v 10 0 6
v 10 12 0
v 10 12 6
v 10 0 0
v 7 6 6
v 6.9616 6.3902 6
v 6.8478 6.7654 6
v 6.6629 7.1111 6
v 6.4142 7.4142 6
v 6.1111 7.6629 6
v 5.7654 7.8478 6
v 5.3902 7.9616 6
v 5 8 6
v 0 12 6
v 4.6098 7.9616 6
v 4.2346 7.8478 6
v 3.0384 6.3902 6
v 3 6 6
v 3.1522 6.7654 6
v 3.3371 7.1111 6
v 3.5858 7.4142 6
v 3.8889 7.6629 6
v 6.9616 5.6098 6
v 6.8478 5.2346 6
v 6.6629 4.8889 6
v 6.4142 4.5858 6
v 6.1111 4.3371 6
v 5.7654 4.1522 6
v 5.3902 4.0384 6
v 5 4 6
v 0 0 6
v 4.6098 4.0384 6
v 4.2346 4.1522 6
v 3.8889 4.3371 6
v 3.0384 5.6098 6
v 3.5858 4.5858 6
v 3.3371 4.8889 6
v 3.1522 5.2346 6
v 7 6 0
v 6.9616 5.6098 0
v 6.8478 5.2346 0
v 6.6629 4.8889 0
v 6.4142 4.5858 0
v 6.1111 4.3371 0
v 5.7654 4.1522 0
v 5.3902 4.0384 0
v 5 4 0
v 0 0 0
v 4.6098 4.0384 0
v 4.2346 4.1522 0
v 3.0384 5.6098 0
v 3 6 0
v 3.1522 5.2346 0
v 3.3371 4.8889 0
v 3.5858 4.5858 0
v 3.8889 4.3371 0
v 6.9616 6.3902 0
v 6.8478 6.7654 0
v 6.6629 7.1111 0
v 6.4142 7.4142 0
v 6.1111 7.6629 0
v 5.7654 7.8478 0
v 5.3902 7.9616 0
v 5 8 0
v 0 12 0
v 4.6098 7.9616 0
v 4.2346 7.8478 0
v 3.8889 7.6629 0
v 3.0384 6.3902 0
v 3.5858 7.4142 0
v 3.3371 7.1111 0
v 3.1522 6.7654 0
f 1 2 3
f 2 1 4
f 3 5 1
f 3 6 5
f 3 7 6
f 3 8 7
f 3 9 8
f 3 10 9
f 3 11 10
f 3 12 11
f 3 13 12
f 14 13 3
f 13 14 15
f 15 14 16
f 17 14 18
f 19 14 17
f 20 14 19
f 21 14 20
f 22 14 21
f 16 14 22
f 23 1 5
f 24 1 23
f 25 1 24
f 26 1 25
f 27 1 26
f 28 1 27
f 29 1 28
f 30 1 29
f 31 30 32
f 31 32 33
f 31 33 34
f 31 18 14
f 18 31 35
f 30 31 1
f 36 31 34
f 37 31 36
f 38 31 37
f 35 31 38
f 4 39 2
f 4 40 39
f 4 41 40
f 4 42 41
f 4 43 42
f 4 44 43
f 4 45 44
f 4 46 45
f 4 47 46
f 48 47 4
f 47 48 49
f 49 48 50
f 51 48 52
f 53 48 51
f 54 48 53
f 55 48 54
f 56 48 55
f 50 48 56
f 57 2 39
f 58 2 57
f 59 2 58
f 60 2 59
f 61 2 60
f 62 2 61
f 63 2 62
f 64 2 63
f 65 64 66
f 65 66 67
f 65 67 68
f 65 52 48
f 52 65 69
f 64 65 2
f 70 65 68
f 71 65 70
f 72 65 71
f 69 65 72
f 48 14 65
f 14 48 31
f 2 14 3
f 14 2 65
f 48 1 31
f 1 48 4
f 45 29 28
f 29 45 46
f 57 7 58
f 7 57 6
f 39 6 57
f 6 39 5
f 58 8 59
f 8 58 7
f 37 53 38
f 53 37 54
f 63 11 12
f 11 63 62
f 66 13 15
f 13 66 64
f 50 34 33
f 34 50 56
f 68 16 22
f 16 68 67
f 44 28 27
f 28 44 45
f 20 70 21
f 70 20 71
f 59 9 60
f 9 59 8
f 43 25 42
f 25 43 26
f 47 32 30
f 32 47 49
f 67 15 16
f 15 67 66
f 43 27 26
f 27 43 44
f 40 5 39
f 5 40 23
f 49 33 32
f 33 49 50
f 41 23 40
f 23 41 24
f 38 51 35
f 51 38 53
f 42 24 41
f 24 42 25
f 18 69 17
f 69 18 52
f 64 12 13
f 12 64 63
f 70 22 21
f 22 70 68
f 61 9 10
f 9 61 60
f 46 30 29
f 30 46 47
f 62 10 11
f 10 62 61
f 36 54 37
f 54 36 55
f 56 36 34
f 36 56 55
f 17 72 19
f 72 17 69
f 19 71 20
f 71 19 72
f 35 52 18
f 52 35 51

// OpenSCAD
$fn = 32;

// ----------------------------------------------------------------------
// Micro pad: drilled pad, 5-20 mm class
// ----------------------------------------------------------------------

// --- parameters (mm) ---
pad_l = 10;               // pad length, X
pad_w = 12;               // pad width, Y
pad_t = 6;                // pad thickness, Z
hole_d = 4;               // through hole diameter

difference() {
  cube([pad_l, pad_w, pad_t]);
  translate([pad_l / 2, pad_w / 2, -1])
    cylinder(h = pad_t + 2, d = hole_d);
}
